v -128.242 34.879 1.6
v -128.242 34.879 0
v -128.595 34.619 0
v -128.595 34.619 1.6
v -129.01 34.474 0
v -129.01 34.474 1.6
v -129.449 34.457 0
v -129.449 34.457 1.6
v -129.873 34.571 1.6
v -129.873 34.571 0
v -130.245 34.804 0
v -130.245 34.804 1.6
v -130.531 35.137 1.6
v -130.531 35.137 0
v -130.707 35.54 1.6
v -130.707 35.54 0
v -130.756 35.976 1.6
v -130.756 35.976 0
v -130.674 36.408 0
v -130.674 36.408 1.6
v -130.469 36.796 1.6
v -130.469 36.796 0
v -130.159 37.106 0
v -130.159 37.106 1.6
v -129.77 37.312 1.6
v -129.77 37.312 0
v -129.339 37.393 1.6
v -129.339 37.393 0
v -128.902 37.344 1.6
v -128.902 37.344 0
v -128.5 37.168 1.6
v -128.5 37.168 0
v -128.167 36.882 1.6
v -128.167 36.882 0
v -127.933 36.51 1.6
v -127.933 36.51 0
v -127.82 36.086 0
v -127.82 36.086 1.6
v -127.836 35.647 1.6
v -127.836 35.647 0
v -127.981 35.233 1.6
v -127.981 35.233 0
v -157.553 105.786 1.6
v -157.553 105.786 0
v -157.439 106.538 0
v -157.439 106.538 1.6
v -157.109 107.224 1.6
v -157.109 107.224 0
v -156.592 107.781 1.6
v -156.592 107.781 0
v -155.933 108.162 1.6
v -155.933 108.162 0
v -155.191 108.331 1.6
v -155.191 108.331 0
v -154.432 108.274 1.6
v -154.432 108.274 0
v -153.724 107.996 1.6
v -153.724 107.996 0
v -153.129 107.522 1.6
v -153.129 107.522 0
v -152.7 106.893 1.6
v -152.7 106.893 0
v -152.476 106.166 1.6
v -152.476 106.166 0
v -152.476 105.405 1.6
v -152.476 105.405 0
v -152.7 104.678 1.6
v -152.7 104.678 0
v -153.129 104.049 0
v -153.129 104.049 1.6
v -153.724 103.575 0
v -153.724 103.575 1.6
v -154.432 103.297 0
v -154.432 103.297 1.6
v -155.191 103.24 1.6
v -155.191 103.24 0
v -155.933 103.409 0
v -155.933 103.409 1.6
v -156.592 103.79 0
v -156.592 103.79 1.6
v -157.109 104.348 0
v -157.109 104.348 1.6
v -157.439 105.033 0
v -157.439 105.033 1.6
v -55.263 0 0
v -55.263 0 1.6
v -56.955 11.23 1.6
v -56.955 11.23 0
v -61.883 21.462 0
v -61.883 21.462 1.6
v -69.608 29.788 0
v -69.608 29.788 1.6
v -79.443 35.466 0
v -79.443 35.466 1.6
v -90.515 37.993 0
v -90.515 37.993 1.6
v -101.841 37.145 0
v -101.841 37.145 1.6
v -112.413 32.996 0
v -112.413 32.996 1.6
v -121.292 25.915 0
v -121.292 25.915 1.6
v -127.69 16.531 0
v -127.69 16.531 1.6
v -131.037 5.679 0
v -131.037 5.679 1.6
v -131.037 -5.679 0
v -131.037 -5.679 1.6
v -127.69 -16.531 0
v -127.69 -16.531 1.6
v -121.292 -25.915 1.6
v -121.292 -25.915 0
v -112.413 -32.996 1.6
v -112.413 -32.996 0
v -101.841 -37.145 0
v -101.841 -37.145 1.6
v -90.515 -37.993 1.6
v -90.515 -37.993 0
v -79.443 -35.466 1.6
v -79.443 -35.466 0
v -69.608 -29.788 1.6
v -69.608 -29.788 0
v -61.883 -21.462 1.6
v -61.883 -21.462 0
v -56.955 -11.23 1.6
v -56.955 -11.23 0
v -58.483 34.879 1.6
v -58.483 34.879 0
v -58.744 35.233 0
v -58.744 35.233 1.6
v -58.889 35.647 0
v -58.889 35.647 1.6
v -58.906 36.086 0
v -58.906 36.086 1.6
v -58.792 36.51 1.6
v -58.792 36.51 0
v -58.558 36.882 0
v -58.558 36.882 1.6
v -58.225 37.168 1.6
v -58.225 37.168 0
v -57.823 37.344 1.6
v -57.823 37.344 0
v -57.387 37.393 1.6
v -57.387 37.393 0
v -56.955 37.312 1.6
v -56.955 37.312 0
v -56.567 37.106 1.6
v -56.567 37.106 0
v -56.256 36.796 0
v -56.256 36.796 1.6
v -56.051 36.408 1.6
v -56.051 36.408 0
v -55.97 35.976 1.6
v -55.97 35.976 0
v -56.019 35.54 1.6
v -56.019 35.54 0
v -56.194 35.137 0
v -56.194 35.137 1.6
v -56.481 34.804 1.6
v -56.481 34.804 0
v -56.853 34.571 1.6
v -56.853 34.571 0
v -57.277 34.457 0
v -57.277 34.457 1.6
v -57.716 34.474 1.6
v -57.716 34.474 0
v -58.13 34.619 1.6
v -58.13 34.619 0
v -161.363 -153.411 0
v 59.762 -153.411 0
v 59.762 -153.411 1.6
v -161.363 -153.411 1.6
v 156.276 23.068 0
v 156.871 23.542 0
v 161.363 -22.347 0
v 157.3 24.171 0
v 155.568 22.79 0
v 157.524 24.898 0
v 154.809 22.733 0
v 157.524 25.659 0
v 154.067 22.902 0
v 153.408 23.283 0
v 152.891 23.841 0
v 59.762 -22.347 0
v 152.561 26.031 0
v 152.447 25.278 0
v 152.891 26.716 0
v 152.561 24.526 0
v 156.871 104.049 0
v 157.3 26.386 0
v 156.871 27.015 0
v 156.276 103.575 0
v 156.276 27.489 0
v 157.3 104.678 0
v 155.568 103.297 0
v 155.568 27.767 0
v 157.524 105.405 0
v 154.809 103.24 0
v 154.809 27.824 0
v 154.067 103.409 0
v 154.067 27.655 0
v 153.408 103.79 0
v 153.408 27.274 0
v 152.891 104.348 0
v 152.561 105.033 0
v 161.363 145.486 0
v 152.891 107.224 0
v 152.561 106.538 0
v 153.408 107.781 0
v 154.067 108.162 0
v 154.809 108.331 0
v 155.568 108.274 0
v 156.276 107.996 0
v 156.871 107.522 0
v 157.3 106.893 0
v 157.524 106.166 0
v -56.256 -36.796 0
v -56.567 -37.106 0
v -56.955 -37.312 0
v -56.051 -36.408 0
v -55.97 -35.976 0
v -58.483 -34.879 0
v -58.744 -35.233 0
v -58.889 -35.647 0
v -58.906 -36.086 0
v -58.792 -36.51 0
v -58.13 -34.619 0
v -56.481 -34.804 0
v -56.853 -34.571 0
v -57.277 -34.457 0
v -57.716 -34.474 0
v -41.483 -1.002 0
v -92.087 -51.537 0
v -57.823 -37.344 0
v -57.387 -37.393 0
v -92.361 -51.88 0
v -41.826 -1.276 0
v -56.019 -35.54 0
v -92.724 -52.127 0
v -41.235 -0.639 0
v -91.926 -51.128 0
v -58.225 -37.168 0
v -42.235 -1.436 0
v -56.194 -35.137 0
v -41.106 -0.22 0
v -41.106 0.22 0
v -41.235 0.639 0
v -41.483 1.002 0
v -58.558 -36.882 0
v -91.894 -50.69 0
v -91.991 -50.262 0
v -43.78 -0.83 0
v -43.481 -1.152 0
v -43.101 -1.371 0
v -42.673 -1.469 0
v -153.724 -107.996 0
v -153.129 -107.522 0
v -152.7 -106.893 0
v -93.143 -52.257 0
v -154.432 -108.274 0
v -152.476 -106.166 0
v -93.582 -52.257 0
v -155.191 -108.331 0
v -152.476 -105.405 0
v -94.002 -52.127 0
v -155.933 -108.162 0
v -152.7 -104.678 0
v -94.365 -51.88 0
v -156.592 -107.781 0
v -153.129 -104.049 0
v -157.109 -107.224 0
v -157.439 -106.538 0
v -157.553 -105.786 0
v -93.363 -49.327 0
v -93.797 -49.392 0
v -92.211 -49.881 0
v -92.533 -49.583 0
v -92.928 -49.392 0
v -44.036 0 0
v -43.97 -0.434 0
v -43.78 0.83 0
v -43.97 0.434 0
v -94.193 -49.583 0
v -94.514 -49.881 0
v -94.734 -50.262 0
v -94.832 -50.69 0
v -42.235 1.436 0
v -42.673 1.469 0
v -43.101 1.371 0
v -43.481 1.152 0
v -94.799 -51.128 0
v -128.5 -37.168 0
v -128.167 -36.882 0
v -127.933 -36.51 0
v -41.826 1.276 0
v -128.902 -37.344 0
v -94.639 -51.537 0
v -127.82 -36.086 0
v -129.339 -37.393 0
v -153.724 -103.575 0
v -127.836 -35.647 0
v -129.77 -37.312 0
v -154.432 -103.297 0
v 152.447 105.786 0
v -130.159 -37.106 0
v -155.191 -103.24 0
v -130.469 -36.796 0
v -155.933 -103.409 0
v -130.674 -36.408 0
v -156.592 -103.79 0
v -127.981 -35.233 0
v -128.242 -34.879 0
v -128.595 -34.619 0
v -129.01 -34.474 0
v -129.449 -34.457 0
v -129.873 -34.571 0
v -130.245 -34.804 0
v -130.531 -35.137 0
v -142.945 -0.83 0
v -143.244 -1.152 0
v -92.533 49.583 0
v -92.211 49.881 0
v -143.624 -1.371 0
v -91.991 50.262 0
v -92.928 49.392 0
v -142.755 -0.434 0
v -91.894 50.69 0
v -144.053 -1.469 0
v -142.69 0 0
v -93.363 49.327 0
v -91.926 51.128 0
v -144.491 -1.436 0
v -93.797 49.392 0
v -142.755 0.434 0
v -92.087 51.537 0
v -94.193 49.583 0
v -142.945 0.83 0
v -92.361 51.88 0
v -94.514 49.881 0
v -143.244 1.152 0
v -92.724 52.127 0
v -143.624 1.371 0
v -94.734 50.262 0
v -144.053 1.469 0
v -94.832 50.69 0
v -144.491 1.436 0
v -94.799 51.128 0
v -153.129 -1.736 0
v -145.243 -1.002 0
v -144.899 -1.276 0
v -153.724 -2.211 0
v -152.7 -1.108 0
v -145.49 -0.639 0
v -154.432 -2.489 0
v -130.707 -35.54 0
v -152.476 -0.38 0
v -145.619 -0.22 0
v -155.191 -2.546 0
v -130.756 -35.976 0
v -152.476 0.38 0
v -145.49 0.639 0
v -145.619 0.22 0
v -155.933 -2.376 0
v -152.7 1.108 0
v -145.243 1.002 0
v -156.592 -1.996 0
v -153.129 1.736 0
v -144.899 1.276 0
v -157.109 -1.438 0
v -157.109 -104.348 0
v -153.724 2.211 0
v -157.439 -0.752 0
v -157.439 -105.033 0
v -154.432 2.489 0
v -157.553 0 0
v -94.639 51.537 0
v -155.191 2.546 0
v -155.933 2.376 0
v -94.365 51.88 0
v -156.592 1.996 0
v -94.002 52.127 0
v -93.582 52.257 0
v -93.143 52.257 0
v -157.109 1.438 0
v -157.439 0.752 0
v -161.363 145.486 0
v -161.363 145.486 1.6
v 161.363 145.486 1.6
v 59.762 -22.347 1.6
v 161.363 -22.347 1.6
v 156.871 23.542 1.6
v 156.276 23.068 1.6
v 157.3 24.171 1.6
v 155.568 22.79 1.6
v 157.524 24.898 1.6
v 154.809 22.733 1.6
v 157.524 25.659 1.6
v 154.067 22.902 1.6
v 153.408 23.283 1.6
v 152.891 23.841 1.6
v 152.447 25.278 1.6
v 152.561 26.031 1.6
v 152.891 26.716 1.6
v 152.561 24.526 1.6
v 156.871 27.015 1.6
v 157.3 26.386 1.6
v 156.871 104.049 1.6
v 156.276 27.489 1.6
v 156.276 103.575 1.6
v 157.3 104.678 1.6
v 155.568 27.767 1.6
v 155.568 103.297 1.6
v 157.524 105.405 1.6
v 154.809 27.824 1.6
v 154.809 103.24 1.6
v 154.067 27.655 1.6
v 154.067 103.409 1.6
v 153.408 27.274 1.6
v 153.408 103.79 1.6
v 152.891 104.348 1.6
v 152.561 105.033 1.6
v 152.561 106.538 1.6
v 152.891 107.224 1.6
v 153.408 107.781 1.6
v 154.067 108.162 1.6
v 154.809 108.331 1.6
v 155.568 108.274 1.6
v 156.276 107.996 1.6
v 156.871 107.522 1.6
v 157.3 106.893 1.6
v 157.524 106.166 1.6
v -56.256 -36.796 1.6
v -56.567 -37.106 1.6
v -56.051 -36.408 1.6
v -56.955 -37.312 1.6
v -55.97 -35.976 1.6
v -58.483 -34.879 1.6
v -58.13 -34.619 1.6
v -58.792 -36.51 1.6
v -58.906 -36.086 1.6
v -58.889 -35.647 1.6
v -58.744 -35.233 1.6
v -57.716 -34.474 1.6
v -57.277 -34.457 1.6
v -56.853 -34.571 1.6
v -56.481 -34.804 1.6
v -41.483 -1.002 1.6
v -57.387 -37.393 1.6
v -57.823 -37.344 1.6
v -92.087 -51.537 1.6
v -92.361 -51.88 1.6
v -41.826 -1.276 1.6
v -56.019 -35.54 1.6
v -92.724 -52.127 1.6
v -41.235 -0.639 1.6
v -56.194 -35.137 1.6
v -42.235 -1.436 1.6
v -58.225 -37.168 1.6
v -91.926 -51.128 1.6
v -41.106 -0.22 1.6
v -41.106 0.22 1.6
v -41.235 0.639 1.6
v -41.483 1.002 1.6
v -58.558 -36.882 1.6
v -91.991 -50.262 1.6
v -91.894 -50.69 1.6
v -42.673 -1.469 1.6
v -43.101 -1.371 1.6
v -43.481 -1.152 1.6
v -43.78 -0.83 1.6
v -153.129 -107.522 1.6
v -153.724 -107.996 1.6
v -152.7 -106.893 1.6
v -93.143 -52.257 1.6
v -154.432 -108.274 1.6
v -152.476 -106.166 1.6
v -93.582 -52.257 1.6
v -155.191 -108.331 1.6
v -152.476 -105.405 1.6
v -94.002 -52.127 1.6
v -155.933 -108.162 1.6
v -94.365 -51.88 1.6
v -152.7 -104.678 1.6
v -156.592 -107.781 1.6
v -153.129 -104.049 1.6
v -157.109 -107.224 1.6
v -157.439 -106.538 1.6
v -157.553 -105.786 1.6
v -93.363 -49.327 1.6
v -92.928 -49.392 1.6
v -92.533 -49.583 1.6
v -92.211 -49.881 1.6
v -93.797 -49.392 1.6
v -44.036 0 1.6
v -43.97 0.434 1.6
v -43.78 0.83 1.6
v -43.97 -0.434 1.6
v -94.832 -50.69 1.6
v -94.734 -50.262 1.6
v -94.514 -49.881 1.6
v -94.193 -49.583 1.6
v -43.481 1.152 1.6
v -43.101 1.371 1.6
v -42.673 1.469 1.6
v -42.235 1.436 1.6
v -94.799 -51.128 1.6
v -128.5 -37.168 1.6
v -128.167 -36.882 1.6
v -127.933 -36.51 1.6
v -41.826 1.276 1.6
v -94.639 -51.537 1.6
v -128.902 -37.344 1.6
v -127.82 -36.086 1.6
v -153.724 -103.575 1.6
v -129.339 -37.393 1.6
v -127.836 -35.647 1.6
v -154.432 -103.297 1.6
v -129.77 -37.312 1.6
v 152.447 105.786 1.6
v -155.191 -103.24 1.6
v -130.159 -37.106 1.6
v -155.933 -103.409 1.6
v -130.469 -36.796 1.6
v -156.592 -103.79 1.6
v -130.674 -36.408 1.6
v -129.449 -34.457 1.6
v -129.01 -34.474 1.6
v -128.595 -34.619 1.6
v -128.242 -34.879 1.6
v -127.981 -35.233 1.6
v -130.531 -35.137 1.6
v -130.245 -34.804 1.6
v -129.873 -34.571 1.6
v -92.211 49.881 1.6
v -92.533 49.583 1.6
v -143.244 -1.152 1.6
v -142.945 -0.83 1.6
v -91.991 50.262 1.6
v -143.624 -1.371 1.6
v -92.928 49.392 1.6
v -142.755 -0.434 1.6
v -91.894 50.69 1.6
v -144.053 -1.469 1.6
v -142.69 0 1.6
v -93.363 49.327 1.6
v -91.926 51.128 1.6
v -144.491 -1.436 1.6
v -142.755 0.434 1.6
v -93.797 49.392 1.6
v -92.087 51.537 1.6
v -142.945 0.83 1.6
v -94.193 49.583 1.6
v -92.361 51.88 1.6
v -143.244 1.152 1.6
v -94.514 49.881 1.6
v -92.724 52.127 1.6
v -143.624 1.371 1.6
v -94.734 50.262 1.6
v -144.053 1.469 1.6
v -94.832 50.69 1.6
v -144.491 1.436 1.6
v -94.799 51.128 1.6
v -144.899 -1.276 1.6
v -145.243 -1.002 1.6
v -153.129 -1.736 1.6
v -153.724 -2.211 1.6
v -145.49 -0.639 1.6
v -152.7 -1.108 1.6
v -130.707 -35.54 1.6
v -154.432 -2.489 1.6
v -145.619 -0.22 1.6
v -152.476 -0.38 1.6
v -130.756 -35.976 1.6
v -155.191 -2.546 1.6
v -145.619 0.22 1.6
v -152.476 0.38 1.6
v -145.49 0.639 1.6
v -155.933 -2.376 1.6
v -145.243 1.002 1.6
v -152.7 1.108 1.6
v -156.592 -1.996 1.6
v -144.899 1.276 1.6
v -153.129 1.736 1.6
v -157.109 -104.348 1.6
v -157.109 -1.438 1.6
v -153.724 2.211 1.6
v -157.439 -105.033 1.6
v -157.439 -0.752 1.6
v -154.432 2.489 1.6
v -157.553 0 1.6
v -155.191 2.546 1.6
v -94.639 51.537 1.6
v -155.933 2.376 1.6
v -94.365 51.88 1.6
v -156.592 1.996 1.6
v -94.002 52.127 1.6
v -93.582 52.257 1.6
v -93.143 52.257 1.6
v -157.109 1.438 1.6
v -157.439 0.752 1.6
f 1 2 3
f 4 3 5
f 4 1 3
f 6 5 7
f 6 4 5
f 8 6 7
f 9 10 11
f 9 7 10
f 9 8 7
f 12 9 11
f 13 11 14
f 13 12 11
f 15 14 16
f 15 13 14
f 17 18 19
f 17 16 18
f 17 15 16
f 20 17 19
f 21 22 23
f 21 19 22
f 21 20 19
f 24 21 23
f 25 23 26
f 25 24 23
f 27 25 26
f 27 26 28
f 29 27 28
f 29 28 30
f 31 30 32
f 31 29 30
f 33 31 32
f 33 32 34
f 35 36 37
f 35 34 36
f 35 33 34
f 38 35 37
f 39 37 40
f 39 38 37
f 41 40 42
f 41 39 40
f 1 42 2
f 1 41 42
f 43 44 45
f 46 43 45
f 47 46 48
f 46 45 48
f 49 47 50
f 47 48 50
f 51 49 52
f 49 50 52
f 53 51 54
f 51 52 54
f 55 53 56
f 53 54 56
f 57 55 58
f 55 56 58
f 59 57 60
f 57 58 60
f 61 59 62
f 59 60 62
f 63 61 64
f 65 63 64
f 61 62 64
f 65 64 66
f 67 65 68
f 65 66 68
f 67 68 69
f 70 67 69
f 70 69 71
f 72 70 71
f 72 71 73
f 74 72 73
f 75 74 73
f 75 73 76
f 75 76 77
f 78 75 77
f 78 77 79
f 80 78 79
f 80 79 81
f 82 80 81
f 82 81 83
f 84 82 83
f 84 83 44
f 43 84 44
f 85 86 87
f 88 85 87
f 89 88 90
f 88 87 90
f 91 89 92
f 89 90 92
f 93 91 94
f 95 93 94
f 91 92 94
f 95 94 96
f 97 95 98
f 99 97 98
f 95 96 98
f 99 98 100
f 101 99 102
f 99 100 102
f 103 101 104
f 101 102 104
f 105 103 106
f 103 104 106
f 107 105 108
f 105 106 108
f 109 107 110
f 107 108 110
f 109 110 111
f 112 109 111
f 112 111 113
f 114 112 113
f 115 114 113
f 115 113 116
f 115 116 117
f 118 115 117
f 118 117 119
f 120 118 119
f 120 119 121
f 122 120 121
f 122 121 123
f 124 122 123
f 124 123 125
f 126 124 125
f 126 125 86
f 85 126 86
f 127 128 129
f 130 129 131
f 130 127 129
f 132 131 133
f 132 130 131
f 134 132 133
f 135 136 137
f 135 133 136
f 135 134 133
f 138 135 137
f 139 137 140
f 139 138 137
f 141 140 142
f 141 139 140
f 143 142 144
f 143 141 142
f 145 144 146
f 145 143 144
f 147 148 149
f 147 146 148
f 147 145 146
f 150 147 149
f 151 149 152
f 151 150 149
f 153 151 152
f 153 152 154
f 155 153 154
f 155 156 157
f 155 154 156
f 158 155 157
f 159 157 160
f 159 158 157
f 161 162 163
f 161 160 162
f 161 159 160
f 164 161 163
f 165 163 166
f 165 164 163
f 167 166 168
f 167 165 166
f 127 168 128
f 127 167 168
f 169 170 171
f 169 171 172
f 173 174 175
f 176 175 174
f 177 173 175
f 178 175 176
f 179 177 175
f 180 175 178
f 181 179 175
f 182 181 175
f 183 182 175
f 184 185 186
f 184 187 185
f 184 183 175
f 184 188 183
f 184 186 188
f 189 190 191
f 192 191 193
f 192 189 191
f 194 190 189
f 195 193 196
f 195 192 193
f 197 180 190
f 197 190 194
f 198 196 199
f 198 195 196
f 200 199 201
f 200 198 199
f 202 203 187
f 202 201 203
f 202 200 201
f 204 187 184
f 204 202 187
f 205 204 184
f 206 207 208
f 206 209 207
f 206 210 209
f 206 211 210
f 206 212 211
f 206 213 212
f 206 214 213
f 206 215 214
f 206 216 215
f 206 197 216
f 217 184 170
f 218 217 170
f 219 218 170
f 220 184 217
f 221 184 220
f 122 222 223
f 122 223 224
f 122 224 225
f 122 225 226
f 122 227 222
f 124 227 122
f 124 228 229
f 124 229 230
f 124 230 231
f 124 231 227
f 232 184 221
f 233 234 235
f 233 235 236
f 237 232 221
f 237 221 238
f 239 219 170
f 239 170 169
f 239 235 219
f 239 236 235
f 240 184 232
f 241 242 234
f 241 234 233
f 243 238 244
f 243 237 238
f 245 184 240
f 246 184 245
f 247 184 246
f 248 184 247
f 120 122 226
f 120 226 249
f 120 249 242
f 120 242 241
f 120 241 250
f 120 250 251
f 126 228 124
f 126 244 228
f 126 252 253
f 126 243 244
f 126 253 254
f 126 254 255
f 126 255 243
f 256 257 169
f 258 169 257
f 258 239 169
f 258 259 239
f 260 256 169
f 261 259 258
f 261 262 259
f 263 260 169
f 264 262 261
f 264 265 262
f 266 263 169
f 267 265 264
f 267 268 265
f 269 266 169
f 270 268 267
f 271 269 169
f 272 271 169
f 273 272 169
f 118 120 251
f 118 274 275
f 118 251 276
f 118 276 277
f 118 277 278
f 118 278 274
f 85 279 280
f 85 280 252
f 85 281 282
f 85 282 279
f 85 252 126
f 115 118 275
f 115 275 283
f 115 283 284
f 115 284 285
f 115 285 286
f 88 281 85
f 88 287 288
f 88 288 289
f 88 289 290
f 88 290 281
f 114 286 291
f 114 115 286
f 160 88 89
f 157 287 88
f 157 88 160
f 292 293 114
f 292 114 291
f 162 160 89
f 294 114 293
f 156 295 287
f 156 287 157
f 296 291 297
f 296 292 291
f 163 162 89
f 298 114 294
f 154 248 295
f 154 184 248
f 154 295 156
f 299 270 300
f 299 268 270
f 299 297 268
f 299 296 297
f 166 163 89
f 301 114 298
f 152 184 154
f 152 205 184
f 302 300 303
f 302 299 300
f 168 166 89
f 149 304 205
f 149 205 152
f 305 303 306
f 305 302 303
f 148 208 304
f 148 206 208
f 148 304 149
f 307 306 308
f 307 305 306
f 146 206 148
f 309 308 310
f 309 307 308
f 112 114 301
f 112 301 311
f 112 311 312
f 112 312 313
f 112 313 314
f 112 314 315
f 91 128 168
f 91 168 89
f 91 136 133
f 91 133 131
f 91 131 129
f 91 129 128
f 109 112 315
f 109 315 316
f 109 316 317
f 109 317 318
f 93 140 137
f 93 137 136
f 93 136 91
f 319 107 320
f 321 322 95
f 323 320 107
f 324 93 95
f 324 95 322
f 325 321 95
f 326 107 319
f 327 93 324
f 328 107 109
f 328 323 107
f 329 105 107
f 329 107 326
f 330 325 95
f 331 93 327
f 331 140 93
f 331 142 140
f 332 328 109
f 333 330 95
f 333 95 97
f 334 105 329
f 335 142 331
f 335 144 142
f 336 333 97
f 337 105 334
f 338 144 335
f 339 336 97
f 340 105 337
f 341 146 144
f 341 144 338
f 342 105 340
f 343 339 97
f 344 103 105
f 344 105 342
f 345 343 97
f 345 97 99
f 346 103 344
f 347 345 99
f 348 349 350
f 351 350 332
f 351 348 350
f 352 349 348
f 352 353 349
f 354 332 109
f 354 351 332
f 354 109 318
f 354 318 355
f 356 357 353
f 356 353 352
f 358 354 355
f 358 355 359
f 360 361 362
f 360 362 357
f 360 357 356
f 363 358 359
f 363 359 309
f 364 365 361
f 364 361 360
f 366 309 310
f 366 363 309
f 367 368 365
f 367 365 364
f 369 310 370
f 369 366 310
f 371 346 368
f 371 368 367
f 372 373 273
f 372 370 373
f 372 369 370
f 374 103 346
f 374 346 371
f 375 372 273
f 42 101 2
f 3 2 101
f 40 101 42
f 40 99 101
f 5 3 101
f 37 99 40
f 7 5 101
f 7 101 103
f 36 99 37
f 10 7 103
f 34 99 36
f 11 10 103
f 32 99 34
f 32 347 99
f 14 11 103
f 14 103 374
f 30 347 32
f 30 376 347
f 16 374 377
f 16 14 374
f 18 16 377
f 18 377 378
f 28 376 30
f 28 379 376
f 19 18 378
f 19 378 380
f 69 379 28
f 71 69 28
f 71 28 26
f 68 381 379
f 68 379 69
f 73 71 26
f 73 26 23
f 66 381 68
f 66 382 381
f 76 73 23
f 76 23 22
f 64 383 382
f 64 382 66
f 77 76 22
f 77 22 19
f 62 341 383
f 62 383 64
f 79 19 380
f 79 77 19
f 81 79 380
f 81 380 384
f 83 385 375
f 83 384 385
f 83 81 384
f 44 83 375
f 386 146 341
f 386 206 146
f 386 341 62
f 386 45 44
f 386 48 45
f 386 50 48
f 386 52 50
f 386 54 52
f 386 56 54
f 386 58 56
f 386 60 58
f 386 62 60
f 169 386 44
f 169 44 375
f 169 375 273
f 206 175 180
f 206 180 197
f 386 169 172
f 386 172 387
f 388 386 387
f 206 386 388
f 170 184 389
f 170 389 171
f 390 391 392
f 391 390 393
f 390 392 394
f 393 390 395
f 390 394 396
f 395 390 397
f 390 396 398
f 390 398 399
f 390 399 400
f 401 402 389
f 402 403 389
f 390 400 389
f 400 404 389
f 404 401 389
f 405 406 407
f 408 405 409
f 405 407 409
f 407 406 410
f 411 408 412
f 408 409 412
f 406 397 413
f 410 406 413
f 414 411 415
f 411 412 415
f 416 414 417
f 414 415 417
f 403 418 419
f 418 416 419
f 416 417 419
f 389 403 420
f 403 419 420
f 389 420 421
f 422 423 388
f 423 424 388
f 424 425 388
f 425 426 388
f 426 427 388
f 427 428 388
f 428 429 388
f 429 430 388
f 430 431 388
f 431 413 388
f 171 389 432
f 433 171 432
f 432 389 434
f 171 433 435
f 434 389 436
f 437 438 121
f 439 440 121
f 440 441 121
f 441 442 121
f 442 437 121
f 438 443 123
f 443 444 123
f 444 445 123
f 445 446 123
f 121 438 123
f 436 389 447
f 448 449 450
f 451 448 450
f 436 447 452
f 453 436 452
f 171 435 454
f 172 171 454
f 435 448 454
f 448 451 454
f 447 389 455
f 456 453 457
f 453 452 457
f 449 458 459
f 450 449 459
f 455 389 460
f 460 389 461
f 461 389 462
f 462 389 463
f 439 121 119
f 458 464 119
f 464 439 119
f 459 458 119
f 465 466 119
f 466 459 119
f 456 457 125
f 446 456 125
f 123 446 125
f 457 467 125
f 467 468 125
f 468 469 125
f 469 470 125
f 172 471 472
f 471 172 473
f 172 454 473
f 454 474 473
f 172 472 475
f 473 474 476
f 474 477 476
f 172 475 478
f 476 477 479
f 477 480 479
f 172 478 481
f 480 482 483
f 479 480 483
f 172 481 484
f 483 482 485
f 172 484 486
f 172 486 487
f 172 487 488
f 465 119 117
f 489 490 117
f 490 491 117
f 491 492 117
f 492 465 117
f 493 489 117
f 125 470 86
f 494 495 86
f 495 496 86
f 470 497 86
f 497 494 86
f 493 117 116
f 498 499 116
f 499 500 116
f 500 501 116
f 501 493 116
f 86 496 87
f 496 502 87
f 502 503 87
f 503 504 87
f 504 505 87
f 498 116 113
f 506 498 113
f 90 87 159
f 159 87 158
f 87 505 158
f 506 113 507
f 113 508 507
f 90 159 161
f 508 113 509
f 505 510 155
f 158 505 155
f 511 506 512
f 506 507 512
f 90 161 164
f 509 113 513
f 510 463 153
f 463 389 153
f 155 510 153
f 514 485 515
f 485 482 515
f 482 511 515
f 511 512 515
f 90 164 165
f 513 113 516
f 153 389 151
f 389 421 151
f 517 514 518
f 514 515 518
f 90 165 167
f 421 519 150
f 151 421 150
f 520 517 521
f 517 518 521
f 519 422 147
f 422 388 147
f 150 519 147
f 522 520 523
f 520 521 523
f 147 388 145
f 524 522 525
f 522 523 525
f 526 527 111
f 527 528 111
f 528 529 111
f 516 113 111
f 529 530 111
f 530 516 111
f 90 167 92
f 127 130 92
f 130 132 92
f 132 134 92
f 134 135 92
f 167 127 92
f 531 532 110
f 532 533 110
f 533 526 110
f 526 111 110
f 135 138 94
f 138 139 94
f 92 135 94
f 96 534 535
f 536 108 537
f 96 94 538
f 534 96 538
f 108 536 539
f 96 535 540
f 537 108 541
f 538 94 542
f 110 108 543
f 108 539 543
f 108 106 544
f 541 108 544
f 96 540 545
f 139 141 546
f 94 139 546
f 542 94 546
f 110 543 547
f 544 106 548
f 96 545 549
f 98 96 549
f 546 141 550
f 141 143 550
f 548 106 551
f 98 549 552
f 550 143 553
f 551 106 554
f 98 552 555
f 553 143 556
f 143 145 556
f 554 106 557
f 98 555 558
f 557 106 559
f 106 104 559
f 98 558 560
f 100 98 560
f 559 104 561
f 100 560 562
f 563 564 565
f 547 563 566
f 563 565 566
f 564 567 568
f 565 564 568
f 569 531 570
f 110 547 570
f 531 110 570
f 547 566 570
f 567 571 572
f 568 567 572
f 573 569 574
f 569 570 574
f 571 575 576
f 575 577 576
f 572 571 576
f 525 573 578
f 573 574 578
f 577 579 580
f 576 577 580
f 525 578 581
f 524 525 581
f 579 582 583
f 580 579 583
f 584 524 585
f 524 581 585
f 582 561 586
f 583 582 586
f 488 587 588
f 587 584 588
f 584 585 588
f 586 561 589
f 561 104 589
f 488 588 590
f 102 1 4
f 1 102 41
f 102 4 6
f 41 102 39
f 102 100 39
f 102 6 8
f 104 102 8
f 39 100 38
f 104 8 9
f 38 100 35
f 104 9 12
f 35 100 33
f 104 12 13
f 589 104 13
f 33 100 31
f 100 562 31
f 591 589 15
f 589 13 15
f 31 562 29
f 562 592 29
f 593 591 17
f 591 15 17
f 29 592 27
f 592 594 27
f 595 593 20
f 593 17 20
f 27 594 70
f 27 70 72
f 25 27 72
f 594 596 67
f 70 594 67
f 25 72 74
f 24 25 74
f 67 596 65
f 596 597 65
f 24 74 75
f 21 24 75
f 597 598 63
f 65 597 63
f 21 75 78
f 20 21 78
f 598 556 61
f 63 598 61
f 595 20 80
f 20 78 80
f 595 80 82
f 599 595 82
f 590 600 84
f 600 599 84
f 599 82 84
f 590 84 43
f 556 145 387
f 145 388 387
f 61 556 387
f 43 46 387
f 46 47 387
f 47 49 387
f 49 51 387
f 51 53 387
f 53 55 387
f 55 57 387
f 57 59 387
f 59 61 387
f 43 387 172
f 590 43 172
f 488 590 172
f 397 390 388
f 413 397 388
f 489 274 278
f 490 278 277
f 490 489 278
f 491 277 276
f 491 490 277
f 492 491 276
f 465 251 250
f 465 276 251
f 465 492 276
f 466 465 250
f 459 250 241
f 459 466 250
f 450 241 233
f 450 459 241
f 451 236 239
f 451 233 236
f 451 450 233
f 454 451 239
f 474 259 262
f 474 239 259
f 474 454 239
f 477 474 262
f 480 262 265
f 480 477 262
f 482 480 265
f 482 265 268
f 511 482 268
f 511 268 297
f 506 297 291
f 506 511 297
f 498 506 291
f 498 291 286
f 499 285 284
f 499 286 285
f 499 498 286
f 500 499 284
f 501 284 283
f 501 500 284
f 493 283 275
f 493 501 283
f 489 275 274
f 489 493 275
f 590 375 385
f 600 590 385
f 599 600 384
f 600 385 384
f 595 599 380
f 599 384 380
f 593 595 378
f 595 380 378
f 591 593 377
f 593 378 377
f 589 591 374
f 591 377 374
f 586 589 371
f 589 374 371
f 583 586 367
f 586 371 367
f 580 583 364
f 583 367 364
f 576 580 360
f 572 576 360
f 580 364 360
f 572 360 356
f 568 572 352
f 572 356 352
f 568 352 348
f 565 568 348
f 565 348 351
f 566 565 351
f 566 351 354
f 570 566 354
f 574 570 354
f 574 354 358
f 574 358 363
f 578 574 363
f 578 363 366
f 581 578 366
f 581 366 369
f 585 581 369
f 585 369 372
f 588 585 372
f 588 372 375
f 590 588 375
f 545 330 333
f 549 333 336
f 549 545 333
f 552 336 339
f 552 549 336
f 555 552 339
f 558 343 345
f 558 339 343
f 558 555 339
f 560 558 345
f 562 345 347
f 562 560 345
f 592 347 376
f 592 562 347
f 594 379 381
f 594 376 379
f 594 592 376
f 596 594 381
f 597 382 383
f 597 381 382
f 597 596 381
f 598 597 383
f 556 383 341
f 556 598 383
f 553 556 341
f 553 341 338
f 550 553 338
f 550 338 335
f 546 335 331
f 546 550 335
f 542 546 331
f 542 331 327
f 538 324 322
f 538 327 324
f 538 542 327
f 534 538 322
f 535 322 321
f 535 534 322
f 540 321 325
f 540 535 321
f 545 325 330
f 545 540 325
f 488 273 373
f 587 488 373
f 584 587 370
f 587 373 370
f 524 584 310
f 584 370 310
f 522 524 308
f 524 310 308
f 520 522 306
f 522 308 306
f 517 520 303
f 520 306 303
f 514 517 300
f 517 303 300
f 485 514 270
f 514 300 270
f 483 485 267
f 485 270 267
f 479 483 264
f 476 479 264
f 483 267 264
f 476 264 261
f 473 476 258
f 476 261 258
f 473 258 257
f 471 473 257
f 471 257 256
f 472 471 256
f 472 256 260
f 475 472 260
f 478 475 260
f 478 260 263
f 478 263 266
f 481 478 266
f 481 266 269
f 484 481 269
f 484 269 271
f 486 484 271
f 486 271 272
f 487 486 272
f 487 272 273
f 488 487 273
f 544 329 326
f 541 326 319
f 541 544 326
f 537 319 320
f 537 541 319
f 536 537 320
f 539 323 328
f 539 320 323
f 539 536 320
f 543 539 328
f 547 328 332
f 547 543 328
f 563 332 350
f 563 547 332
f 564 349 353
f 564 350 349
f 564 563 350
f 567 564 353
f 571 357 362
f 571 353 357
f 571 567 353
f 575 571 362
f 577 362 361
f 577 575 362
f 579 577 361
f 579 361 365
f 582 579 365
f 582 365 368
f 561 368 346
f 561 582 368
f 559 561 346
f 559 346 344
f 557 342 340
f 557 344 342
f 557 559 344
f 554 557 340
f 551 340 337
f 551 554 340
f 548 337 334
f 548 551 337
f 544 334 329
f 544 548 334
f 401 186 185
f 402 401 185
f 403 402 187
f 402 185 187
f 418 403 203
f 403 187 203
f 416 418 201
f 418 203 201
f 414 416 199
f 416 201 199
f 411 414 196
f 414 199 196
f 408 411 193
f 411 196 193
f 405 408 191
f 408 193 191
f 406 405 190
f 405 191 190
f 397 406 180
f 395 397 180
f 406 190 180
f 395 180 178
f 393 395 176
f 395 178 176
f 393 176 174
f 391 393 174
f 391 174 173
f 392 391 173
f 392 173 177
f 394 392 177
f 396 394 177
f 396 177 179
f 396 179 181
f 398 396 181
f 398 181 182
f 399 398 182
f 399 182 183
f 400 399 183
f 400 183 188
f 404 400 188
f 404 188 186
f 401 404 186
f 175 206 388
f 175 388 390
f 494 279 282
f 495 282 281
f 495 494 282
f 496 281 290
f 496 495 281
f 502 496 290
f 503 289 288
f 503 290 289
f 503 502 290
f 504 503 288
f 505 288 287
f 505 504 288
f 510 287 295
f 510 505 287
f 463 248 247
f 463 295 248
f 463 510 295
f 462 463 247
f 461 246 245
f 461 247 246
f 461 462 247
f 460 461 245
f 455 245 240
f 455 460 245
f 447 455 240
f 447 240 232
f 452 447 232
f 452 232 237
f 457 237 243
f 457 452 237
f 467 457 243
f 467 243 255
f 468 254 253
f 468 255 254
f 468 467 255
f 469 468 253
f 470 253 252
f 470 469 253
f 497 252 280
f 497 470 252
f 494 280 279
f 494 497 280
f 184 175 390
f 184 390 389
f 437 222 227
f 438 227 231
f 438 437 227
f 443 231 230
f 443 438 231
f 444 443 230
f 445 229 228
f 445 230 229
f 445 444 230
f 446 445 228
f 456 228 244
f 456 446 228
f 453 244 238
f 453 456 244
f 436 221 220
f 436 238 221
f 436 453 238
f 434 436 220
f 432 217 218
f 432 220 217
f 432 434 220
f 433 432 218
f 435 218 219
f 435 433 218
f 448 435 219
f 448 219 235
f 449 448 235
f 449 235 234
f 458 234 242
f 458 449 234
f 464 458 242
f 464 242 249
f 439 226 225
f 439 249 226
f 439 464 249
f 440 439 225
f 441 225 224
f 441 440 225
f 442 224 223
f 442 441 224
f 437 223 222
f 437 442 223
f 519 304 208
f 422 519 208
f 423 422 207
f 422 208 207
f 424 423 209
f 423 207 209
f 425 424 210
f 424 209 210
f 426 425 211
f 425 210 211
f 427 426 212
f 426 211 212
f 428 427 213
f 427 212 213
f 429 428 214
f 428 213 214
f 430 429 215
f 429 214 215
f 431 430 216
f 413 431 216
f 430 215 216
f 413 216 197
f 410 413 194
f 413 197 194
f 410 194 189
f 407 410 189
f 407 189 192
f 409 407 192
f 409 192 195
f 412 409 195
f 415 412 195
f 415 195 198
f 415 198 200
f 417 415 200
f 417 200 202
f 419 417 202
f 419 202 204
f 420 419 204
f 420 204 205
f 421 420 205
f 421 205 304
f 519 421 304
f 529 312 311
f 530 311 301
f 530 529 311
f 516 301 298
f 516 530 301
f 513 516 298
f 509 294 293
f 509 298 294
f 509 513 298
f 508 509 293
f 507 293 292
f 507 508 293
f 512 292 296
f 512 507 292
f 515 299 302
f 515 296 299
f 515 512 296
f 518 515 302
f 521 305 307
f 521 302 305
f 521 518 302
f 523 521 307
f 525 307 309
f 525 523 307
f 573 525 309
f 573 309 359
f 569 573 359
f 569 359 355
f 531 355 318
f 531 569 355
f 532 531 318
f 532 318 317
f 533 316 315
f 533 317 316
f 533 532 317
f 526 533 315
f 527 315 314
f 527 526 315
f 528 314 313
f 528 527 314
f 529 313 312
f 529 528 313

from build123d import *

# Parameters (mm, degrees)
BOSS_EXTRUDE1_DEPTH        = 1.6002
SKETCH2_R                  = 38.1
CUT_EXTRUDE1_DEPTH         = 2.6002
CIRPATTERN1_COUNT          = 8
F_10_CLEARANCE_HOLE1_D     = 5.1054
F_10_CLEARANCE_HOLE1_DEPTH = 129.53
F_10_CLEARANCE_HOLE1_TIP   = 1.533816902


with BuildPart() as part:
    # Sketch1 → Boss-Extrude1 (new body)
    with BuildSketch(Plane.XY):
        Polygon((161.3627, -22.34670835), (59.7625, -22.34670835), (59.7625, -153.41070835), (-161.3627, -153.41070835), (-161.3627, 145.48590835), (161.3627, 145.48590835), align=None)
    extrude(amount=BOSS_EXTRUDE1_DEPTH)

    # Sketch2 → Cut-Extrude1 (cut, through all)
    with BuildSketch(Plane.XY.offset(1.6002)):
        with Locations((-93.3627, 0)):
            Circle(SKETCH2_R)
    extrude(amount=-CUT_EXTRUDE1_DEPTH, mode=Mode.SUBTRACT)

    # Sketch11 → #4 Clearance Hole1 (revolve, cut)
    with BuildSketch(Plane(origin=(-93.3627, 50.8, 1.6002), x_dir=(0, -1, 0), z_dir=(1, 0, 0))):
        Polygon((0, 0), (0, 173.855187864), (1.4732, 172.97), (1.4732, 0), align=None)
    f_4_clearance_hole1 = revolve(axis=Axis((-93.3627, 50.8, 7.9502), (0, 0, -1)), mode=Mode.SUBTRACT)

    # CirPattern1: #4 Clearance Hole1 ×8 about axis
    cirpattern1_axis = Axis((-93.3627, 0, 0), (0, 0, 1))
    for i in range(1, CIRPATTERN1_COUNT):
        add(f_4_clearance_hole1.rotate(cirpattern1_axis, i * 360 / CIRPATTERN1_COUNT), mode=Mode.SUBTRACT)

    # #10 Clearance Hole1
    with Locations(Plane.XY.offset(1.6002)):
        with Locations((-155, 105.78570835), (155, 105.78570835), (-155, -105.78570835), (155, 25.27849165), (-155, 0)):
            Hole(F_10_CLEARANCE_HOLE1_D / 2, depth=F_10_CLEARANCE_HOLE1_DEPTH)
            with Locations((0, 0, -(F_10_CLEARANCE_HOLE1_DEPTH + F_10_CLEARANCE_HOLE1_TIP / 2))):  # 118° drill point
                Cone(0, F_10_CLEARANCE_HOLE1_D / 2, F_10_CLEARANCE_HOLE1_TIP, mode=Mode.SUBTRACT)


solid = part.part
